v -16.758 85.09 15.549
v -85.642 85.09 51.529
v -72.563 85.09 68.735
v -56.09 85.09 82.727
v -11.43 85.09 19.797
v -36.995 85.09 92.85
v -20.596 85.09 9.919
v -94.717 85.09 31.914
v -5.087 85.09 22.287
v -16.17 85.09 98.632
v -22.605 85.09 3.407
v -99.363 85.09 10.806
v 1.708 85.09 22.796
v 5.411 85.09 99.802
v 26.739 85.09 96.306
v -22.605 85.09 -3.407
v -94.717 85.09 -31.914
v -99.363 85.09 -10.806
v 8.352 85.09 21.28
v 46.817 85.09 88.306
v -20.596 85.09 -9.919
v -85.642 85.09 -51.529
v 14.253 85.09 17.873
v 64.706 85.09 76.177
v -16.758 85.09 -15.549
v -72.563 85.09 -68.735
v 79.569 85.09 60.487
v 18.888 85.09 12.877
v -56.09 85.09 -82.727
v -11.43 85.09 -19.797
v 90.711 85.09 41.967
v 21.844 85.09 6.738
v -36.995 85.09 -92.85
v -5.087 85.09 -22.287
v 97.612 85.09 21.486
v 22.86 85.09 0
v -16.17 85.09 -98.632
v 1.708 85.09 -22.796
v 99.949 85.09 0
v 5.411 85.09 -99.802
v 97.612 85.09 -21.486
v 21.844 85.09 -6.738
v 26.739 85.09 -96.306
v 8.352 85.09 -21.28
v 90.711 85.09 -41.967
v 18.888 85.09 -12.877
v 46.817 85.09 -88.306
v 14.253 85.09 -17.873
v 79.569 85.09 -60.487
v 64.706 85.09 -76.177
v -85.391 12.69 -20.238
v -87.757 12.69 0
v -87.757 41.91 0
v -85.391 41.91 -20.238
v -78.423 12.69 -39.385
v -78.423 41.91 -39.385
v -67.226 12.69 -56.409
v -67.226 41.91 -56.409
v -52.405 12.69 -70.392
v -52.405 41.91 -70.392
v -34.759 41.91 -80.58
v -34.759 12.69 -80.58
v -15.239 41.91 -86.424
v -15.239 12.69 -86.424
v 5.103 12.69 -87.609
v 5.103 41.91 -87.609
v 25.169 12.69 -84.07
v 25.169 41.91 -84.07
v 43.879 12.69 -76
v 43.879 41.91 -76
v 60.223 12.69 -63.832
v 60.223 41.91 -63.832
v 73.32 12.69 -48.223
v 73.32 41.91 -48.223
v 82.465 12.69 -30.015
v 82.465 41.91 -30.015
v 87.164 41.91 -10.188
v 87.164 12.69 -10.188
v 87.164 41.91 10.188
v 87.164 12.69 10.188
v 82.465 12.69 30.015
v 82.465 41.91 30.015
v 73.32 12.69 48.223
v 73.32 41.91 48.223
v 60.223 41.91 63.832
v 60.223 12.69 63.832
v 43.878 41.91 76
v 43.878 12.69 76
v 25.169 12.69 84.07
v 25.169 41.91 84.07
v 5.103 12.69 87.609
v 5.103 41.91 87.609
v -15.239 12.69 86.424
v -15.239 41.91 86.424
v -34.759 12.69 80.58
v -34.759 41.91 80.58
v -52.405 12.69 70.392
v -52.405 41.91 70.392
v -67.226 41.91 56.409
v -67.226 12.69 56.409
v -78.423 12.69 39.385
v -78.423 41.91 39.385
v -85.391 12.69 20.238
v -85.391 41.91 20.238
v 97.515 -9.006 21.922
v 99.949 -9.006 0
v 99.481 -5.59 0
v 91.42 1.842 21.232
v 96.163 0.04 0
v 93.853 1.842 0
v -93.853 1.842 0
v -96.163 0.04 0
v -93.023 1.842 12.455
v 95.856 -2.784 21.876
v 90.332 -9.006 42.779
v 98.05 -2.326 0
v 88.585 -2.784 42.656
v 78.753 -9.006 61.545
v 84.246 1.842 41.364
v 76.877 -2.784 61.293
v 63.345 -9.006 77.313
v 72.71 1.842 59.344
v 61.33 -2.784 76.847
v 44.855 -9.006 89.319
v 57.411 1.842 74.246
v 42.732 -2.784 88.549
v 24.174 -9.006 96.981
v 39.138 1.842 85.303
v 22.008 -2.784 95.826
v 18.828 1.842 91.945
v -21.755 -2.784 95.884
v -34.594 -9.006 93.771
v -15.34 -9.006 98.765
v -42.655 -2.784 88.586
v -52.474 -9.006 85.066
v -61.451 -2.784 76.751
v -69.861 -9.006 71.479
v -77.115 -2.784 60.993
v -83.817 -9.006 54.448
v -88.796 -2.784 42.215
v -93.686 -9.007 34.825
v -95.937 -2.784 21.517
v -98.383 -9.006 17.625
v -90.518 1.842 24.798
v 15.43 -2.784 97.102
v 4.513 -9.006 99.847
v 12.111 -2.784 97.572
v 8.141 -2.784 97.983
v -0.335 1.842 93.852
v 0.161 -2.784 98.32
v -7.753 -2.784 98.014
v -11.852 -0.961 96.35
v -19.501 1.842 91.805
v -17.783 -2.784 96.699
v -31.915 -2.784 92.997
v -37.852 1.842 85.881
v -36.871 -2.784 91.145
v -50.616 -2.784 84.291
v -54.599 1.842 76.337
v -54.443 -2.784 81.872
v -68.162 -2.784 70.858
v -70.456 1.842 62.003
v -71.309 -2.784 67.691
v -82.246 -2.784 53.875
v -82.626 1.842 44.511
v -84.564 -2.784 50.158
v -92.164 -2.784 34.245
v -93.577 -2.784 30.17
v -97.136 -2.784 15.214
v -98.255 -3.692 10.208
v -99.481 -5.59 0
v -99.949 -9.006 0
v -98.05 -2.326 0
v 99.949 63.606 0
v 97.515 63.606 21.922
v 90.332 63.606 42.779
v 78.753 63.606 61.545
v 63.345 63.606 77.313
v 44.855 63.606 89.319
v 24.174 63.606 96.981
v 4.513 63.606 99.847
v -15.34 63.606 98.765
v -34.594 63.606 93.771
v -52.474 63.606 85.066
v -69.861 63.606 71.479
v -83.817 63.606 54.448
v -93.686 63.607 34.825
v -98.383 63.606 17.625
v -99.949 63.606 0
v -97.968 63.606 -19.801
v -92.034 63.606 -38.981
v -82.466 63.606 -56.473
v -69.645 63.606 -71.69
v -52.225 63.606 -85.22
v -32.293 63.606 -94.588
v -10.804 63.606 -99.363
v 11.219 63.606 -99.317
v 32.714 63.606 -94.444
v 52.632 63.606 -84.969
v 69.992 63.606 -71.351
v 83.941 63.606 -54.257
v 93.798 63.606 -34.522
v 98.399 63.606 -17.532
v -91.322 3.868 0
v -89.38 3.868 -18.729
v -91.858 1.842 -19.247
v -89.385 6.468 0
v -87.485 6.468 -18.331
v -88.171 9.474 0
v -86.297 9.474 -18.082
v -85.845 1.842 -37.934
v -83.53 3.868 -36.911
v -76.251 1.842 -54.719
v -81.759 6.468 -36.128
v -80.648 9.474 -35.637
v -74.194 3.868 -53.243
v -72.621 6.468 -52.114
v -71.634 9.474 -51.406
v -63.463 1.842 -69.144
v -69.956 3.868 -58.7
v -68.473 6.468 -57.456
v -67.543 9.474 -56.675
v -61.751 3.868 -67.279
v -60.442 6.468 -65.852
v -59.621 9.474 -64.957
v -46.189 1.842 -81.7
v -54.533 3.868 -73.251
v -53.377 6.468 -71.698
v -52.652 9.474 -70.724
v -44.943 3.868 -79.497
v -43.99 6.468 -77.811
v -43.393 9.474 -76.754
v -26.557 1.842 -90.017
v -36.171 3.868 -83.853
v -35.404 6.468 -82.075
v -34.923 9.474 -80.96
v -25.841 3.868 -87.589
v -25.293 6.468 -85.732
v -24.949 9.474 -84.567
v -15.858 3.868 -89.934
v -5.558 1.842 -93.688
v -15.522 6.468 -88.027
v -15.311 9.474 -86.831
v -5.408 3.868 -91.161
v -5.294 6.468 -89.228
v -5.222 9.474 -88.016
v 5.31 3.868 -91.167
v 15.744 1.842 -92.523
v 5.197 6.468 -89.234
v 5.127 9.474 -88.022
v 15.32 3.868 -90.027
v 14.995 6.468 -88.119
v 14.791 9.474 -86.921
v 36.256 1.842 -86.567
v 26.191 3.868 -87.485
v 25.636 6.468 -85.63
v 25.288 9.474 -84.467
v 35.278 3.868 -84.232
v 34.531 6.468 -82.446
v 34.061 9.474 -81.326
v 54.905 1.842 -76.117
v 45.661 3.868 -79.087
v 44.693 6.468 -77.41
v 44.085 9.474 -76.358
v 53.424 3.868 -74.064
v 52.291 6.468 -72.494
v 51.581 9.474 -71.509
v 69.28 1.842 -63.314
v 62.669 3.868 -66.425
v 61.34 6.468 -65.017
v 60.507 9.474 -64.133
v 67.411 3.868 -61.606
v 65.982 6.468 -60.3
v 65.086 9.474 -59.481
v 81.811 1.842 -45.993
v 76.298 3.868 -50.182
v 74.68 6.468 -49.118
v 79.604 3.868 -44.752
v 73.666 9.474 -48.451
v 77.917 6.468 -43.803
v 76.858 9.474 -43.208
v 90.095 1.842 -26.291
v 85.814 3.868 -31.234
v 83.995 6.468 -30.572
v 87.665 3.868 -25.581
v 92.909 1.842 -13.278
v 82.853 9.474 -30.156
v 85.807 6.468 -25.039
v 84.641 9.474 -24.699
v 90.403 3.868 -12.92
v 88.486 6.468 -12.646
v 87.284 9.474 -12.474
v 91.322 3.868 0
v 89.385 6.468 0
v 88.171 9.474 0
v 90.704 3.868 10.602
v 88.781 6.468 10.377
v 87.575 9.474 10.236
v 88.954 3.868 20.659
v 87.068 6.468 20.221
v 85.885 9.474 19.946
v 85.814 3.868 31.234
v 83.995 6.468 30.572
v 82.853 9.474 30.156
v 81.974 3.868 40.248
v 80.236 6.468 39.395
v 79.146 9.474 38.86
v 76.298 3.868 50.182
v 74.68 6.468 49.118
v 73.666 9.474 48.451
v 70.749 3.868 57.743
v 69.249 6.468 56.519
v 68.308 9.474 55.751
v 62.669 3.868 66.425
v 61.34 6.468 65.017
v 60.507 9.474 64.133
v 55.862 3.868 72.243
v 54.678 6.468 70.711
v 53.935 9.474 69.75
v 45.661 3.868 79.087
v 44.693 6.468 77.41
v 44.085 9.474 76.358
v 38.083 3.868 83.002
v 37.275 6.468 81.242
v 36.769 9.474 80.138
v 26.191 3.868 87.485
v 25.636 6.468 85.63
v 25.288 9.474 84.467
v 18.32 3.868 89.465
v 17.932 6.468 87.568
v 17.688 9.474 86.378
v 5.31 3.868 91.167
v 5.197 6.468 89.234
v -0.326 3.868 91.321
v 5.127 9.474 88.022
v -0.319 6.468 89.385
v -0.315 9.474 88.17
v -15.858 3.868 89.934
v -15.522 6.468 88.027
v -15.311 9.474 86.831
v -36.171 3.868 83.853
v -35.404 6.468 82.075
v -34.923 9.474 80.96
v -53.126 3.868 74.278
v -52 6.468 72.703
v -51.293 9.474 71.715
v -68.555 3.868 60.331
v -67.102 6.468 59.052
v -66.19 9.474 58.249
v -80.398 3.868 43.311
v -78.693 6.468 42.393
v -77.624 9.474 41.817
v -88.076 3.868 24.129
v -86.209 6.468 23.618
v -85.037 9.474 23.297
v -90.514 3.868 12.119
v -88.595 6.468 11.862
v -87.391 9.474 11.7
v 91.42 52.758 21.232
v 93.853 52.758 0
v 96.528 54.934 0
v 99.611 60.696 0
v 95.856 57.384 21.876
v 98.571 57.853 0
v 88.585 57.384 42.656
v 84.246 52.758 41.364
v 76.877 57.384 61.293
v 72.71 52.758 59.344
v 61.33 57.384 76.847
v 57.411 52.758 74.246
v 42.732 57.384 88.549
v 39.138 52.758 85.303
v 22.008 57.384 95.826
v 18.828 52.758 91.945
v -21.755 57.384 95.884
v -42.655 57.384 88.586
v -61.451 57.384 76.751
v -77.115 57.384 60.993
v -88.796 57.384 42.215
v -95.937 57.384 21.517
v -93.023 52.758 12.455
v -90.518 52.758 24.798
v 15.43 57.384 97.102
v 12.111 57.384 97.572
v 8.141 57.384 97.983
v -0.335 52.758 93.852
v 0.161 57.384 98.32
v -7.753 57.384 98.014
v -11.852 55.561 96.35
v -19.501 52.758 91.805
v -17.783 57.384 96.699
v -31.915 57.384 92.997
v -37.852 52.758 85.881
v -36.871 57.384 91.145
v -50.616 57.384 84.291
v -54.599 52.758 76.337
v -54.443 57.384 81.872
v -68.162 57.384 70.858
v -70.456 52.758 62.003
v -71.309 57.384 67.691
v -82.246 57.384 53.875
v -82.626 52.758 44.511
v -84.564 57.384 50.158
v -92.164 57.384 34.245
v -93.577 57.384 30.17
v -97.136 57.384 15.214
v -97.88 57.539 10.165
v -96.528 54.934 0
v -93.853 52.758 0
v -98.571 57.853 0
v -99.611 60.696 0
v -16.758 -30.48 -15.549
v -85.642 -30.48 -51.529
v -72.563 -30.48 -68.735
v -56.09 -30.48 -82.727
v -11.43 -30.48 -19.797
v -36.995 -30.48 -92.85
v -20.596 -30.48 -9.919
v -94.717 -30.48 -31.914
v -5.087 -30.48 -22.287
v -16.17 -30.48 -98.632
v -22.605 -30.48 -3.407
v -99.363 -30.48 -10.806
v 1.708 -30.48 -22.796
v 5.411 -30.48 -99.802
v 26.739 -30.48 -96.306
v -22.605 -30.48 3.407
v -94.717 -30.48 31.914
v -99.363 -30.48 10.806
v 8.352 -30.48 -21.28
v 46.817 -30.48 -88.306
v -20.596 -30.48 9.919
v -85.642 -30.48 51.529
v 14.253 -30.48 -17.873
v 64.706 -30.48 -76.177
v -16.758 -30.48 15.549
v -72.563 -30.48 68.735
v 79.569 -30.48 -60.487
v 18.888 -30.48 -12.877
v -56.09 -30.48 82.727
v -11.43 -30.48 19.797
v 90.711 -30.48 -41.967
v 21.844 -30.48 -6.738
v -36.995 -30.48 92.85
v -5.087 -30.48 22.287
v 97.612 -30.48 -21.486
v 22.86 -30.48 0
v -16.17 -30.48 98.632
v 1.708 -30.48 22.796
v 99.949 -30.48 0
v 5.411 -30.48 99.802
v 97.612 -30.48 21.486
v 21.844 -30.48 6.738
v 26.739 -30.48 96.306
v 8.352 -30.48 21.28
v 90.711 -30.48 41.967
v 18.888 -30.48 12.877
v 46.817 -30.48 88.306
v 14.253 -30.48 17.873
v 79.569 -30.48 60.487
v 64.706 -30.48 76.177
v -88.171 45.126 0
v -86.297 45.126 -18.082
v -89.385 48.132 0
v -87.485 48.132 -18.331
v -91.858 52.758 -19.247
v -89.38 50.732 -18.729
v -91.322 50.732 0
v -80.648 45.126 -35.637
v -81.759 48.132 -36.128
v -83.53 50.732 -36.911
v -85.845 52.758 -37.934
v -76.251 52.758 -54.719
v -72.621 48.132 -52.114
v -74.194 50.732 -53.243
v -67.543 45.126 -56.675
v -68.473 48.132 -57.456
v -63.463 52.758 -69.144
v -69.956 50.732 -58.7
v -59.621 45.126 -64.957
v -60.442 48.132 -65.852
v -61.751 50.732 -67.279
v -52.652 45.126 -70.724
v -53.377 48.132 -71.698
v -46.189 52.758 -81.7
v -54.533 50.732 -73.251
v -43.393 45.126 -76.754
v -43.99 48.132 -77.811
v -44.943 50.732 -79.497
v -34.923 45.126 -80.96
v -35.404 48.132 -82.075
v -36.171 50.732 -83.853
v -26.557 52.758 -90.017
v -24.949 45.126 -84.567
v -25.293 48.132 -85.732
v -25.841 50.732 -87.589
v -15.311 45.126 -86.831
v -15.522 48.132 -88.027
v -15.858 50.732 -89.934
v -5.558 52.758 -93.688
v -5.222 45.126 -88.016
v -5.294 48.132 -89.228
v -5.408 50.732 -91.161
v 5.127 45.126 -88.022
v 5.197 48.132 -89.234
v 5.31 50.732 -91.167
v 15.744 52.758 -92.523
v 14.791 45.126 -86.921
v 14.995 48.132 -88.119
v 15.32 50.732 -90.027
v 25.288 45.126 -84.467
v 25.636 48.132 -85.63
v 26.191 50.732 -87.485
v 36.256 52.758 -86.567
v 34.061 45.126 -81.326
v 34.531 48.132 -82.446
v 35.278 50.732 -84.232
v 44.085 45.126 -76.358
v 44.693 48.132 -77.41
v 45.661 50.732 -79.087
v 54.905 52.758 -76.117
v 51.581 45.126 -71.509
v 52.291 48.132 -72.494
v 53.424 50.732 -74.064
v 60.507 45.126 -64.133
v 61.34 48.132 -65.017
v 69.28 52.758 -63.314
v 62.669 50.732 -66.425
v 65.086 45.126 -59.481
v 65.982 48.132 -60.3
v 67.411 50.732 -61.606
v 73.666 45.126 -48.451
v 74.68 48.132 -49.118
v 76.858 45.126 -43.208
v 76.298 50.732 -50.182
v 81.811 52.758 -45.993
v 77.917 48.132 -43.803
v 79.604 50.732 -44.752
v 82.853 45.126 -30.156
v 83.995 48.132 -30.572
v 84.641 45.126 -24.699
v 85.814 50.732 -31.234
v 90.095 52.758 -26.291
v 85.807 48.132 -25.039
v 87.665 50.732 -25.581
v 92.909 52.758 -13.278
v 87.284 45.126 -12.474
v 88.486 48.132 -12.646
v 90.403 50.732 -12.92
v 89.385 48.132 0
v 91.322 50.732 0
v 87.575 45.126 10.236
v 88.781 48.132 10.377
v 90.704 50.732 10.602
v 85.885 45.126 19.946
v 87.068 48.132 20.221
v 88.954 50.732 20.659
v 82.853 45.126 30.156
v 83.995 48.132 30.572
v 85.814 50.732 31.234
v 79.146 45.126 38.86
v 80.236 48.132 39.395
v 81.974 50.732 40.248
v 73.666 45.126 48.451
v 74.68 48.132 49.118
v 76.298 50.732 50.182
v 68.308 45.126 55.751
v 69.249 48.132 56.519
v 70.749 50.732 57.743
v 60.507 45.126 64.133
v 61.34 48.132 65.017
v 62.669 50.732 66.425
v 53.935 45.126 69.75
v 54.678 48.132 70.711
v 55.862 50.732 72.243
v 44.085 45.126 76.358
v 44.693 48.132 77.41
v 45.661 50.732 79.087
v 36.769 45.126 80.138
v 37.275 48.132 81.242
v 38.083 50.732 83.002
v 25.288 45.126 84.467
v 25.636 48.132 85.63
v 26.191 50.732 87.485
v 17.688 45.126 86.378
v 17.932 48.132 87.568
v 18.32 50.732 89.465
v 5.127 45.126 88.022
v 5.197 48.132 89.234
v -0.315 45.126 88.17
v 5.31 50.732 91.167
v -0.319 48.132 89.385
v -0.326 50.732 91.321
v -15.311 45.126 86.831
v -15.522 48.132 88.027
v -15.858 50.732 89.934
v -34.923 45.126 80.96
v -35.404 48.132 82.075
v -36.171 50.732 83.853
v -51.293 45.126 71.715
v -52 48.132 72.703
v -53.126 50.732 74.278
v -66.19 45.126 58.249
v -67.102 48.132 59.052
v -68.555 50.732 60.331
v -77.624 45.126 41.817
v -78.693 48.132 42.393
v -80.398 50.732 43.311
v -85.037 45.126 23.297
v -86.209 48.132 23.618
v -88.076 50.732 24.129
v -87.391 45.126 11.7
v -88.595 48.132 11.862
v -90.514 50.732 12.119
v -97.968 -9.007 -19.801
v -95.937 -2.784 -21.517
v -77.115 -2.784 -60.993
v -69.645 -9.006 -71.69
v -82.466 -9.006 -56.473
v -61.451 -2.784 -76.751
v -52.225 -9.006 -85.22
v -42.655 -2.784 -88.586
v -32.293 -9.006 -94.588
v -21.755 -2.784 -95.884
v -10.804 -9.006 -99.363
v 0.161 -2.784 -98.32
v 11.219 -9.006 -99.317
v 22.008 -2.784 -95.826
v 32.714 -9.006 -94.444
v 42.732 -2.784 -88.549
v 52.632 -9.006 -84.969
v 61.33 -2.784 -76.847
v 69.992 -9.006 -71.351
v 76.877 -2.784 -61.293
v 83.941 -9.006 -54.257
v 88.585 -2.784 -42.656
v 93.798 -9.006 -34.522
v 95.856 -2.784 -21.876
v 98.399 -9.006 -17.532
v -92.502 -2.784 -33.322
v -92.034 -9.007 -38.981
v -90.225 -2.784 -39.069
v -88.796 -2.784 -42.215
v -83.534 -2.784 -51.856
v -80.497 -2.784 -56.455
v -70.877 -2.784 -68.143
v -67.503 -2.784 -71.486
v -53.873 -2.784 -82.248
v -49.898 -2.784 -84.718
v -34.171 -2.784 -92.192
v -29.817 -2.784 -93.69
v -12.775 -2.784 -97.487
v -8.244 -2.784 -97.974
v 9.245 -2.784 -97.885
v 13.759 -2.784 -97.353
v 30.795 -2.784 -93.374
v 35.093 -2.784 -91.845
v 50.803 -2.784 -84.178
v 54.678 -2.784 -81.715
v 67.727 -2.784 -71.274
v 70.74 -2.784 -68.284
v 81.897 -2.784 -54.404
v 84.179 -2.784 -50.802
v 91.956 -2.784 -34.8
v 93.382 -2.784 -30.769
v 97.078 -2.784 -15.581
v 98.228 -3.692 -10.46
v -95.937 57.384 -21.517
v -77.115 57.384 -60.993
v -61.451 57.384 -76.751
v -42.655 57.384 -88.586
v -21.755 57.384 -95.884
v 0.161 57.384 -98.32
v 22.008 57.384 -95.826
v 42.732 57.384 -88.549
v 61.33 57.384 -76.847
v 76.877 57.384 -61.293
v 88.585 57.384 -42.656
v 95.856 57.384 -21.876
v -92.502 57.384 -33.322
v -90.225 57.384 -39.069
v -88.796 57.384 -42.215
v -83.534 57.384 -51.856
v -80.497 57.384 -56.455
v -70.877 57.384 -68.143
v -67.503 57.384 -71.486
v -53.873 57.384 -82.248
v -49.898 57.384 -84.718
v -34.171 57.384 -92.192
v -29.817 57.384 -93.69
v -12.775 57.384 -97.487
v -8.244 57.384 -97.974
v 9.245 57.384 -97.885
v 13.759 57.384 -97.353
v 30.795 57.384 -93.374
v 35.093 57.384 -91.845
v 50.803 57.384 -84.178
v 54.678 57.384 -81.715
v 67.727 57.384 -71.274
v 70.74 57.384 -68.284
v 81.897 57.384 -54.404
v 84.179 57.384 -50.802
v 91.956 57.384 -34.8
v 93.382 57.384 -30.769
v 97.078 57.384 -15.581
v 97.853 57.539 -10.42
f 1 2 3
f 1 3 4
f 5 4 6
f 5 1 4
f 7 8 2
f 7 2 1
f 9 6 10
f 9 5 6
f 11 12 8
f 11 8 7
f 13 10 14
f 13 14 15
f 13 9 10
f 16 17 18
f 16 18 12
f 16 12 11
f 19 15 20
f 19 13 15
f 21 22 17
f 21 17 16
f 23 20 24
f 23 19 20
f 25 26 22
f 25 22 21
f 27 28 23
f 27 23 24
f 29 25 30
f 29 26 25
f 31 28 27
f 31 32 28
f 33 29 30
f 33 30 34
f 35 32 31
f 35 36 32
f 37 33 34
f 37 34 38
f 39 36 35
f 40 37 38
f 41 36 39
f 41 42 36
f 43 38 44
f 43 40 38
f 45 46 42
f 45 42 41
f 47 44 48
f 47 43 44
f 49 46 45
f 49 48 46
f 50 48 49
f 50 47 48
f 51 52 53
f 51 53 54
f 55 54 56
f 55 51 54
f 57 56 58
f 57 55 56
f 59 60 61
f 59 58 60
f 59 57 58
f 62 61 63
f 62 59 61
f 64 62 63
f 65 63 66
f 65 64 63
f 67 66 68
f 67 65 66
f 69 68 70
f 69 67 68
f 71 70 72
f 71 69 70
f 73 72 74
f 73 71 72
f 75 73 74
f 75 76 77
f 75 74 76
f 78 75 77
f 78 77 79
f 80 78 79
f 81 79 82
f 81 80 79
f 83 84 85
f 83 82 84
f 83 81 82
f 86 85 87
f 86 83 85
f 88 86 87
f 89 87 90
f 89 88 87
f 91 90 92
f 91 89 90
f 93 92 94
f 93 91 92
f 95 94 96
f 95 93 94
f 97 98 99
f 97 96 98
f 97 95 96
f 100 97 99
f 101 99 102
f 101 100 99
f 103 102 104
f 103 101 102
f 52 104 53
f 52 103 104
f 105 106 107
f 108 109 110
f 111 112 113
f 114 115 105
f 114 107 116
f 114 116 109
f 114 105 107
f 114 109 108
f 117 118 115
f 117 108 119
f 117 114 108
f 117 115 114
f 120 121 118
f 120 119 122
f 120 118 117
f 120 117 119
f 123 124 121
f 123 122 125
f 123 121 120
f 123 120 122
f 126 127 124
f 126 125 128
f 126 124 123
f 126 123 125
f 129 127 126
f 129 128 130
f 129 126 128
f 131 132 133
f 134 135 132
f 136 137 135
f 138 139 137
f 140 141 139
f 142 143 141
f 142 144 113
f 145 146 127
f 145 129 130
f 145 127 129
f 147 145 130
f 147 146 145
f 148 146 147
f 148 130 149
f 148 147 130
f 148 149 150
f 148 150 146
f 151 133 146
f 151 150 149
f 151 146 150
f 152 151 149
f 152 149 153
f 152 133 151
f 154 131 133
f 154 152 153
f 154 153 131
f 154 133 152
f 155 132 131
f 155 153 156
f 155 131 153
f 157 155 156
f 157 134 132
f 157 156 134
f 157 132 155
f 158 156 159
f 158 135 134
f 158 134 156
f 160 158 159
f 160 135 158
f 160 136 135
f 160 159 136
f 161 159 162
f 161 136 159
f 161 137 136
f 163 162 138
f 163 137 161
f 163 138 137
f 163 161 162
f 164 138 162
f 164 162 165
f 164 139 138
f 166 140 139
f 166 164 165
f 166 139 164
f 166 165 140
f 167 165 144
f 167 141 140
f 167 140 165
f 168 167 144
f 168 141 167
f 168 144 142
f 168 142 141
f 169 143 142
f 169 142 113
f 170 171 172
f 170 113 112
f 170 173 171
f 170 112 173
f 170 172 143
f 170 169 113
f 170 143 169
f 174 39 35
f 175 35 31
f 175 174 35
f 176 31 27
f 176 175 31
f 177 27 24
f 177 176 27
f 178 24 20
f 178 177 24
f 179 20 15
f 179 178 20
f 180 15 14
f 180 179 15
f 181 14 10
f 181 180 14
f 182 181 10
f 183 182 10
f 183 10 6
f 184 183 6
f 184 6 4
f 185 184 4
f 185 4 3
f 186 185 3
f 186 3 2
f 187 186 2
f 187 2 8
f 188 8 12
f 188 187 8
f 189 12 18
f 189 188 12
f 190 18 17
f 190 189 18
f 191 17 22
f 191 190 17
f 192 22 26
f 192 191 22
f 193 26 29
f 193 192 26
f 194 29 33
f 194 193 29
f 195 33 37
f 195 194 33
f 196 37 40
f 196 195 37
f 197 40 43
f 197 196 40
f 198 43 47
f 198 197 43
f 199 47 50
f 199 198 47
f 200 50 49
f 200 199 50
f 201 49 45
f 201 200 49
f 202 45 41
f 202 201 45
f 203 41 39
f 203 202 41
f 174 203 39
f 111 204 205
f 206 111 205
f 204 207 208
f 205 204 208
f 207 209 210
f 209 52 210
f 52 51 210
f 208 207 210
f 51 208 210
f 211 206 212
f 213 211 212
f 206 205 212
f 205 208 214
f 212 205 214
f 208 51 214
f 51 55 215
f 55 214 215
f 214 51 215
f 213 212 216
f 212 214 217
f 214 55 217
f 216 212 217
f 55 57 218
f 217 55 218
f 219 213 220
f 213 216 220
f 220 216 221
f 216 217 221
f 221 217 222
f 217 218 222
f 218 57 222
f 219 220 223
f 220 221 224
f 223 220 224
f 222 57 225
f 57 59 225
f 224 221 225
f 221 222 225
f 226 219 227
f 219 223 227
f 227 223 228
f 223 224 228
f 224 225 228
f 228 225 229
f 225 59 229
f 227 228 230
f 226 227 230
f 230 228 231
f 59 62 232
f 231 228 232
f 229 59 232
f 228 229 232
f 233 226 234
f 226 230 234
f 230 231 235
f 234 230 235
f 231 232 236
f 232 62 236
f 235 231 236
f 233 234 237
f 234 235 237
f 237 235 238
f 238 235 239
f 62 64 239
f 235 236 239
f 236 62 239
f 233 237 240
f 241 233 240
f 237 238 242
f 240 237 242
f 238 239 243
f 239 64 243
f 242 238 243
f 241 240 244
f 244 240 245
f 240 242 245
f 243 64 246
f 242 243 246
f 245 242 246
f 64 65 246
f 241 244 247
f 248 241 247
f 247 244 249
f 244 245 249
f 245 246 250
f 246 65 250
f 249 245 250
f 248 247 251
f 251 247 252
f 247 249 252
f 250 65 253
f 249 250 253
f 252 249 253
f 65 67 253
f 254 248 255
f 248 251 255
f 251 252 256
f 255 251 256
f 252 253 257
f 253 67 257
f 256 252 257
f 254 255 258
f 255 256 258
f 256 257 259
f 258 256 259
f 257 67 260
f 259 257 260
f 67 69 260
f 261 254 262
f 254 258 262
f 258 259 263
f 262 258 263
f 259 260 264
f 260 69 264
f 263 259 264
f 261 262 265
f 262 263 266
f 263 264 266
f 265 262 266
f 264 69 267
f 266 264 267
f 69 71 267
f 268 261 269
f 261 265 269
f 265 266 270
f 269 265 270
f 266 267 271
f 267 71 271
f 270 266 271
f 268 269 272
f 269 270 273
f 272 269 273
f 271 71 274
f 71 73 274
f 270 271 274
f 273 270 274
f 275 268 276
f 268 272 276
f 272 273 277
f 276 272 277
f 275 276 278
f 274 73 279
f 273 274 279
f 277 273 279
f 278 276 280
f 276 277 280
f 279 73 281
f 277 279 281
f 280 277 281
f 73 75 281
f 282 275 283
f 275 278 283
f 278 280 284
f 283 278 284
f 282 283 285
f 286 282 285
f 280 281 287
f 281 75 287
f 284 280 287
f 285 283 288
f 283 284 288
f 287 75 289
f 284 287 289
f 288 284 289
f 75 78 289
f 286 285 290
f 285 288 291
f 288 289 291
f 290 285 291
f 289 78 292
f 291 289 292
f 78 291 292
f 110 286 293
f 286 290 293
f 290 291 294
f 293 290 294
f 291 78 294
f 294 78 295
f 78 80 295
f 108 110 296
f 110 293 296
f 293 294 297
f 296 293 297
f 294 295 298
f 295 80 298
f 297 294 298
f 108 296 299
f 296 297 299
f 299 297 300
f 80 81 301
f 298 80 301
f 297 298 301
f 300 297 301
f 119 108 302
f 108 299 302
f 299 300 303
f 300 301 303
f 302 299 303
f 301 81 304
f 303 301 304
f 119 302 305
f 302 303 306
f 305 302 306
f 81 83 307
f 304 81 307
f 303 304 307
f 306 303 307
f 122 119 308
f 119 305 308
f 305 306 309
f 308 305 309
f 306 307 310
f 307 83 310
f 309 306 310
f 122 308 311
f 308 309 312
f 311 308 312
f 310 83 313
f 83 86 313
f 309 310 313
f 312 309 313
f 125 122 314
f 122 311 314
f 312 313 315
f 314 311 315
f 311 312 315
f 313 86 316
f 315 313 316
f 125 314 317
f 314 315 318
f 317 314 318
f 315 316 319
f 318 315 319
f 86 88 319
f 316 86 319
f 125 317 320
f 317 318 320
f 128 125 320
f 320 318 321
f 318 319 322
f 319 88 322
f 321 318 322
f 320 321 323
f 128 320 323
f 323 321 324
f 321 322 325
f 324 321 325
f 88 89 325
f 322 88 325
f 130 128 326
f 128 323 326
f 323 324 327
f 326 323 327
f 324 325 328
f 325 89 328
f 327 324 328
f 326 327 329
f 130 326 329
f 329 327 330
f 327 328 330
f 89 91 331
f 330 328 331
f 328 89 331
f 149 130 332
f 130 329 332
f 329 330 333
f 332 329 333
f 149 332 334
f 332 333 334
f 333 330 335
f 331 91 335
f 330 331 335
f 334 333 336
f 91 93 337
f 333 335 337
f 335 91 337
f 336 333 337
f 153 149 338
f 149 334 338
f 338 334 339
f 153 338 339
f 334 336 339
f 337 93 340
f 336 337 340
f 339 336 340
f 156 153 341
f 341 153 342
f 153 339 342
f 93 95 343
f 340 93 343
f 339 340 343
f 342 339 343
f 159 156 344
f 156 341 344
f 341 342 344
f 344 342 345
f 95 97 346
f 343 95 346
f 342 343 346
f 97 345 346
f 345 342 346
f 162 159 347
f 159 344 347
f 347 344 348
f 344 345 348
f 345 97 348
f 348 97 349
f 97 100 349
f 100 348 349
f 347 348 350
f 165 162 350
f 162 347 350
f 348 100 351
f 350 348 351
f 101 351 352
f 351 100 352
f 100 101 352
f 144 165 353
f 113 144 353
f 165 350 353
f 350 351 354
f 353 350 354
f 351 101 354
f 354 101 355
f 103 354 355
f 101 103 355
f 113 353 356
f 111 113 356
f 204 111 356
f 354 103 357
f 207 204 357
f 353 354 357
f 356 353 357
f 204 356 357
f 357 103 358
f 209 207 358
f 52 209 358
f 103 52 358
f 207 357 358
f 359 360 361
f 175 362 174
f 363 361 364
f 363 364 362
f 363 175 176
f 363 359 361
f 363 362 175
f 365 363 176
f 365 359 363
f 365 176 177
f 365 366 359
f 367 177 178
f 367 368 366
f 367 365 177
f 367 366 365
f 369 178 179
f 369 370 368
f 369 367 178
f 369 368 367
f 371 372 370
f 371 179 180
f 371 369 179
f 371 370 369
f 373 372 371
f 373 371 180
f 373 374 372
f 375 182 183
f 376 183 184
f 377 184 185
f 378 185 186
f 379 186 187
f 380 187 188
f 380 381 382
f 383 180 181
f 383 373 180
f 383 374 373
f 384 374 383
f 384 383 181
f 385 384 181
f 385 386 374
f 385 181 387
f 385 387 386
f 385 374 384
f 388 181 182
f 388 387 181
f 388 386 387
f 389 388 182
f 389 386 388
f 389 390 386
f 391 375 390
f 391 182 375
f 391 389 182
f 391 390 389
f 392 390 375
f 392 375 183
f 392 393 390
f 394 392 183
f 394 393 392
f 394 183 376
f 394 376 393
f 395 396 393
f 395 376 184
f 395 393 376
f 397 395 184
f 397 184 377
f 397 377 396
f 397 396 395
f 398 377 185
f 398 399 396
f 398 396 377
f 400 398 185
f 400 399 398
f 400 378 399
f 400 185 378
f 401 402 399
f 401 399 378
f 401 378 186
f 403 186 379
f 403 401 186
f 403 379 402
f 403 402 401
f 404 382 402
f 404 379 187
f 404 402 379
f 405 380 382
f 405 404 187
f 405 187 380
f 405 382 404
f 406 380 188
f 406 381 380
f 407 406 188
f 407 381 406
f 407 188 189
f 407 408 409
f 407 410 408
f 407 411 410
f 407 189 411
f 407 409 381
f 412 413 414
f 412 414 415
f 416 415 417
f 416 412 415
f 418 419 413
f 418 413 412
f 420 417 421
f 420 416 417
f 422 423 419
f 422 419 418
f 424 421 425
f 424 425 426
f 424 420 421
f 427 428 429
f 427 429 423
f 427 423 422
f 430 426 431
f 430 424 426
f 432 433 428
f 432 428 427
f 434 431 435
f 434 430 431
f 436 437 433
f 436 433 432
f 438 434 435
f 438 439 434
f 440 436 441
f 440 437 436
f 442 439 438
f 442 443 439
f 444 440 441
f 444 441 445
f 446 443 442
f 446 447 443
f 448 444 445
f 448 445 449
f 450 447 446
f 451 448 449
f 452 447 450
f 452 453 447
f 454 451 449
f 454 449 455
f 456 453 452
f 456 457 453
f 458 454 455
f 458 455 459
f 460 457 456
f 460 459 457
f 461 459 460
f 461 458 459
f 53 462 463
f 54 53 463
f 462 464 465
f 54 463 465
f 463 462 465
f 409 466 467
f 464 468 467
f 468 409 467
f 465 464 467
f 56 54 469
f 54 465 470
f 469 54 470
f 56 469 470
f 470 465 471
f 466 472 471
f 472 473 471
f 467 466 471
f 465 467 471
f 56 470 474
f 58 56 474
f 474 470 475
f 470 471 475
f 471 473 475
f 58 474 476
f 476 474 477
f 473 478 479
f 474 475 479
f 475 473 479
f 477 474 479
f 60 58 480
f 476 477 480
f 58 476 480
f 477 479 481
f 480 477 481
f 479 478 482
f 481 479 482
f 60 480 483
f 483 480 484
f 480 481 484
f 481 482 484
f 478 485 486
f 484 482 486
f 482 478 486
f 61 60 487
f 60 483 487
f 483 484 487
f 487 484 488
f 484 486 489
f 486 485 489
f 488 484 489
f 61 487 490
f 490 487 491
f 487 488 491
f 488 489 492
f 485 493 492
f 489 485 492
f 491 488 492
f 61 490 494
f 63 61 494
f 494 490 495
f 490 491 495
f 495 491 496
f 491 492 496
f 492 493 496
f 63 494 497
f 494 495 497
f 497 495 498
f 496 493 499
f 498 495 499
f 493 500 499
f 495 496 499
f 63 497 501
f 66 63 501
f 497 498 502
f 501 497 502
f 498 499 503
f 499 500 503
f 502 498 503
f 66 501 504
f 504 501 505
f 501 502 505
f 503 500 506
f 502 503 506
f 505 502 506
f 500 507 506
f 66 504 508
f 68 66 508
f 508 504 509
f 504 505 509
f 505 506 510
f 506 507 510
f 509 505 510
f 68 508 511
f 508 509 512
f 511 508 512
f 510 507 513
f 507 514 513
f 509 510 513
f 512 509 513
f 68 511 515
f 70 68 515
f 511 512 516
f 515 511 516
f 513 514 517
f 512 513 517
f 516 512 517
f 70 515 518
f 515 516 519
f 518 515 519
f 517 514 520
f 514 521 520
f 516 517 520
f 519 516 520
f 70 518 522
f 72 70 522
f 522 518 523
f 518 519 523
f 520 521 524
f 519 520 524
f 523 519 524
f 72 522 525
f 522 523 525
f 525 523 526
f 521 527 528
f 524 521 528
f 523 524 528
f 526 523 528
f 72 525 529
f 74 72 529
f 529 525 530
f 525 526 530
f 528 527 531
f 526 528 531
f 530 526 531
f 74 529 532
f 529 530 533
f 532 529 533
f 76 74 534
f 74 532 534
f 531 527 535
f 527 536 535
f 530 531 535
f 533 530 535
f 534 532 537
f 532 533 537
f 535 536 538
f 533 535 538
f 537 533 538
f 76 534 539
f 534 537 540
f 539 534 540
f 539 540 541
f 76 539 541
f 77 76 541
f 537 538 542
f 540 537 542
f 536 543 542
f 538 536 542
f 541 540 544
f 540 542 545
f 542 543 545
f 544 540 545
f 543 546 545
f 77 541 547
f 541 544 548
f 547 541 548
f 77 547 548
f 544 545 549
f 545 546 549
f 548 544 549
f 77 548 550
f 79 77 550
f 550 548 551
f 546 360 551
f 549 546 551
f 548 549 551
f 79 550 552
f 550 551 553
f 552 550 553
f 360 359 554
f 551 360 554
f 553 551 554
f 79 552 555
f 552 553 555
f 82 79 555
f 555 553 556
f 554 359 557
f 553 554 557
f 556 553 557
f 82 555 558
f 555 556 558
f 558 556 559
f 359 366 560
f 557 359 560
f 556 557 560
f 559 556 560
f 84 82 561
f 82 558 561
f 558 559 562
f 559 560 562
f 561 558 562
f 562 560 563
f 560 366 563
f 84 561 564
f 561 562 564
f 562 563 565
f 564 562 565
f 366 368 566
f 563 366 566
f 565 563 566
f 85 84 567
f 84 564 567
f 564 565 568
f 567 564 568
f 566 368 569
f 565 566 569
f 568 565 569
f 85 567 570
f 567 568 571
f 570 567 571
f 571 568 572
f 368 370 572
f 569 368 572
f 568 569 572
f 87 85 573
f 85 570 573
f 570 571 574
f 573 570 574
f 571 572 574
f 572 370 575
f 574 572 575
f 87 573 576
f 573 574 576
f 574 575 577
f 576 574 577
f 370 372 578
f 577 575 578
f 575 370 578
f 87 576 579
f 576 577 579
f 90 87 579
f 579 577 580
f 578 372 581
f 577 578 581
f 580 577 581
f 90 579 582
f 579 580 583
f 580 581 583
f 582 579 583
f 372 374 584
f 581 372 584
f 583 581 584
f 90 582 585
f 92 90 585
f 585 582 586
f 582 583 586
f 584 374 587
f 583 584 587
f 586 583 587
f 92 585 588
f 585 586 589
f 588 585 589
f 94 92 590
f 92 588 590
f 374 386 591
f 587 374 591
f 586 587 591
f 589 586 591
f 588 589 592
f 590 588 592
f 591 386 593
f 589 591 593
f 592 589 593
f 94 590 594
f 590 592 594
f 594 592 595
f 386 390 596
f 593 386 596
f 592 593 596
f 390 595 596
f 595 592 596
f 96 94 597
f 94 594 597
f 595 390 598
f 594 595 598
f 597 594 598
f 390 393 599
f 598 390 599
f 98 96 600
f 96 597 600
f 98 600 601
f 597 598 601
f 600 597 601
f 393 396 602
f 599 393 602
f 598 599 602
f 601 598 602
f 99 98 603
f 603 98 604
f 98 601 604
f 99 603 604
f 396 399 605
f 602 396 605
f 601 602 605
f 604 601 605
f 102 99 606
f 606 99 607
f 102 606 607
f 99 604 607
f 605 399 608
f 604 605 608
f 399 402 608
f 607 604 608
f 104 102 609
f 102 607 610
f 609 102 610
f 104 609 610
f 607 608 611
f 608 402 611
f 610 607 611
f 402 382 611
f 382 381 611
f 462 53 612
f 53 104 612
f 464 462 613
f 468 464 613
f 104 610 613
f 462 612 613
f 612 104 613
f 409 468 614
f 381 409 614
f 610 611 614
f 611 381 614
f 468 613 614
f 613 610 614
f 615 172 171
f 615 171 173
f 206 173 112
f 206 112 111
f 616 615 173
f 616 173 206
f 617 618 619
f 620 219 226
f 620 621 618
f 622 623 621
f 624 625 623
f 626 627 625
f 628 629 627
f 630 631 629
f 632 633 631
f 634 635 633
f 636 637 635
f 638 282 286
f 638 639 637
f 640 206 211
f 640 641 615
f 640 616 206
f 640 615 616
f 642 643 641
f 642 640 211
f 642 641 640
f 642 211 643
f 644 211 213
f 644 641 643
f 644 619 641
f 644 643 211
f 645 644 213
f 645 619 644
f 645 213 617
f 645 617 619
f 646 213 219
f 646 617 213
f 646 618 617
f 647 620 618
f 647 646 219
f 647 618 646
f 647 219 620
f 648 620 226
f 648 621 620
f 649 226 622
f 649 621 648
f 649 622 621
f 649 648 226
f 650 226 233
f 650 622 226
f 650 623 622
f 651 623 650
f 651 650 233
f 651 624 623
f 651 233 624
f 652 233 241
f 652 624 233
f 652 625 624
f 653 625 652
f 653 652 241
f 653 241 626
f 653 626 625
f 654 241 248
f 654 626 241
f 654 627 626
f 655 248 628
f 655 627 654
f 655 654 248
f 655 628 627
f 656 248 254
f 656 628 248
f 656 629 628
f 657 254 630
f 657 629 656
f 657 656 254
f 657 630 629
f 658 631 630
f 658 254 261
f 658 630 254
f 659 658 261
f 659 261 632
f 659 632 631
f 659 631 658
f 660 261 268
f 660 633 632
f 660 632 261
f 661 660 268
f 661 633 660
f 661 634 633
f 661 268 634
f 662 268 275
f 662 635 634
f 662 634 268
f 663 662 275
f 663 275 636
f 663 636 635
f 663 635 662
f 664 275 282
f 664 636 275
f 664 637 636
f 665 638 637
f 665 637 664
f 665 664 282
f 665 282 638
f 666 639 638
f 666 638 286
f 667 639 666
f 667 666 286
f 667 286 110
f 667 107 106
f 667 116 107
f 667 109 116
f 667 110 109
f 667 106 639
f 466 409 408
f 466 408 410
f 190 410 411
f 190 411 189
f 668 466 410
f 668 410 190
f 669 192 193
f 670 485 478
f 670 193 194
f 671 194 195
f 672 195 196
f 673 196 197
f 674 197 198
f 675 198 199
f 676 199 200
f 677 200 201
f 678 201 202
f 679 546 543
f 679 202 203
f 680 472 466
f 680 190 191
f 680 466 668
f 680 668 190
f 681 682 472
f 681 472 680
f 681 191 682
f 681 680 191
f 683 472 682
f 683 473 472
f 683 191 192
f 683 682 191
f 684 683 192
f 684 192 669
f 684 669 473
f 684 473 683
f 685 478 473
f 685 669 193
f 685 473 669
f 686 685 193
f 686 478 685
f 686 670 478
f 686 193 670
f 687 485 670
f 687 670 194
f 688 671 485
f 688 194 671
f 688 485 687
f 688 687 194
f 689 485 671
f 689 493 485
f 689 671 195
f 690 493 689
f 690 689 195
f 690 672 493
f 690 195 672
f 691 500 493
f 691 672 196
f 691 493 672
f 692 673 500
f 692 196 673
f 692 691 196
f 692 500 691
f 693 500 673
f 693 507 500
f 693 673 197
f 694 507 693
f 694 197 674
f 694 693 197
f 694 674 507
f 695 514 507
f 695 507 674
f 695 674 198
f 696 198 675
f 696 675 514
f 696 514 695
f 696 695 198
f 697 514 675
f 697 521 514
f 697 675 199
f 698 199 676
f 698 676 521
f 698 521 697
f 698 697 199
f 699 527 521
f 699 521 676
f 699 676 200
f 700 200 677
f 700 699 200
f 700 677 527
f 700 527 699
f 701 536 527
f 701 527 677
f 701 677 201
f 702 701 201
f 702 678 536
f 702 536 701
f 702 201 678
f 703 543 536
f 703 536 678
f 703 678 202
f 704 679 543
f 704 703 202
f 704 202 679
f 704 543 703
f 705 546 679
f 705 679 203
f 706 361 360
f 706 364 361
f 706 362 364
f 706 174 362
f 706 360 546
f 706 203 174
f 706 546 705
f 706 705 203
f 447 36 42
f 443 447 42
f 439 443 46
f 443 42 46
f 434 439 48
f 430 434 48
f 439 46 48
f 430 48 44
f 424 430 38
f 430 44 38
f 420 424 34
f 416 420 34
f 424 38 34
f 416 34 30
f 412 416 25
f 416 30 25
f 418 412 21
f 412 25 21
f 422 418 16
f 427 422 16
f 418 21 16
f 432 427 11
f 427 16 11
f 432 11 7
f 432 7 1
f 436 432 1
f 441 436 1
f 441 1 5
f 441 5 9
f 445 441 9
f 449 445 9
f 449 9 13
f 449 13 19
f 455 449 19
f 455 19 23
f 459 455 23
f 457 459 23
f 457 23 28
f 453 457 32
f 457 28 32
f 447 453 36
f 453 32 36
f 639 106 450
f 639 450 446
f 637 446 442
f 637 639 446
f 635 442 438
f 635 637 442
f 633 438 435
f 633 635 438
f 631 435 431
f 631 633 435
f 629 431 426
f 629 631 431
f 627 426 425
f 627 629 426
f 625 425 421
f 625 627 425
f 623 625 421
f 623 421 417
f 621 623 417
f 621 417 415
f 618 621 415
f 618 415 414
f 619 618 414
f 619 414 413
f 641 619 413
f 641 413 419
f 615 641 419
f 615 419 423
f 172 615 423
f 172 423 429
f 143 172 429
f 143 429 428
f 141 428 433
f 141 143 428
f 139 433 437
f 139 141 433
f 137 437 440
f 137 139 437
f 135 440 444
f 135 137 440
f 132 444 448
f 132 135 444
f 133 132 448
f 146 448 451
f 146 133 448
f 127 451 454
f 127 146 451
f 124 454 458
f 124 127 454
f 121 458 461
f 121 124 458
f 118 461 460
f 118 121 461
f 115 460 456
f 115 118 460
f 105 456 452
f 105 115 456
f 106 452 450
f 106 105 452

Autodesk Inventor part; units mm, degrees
ref_plane "YZ Plane" through (0, 0, 0) normal (1, 0, 0) x (0, 1, 0)
ref_plane "XZ Plane" through (0, 0, 0) normal (0, 1, 0) x (-1, 0, 0)
ref_plane "XY Plane" through (0, 0, 0) normal (0, 0, 1) x (1, 0, 0)
sketch "Sketch1" plane through (0, 0, 0) normal (0, 1, 0) x (-1, 0, 0)
  circle A0 centre (0, 0) radius 87.757
  dimension "d0" = 175.514
extrude "Extrusion1" add sketch "Sketch1" along normal blind 54.61
sketch "Sketch2" plane through (0, 54.61, 0) normal (0, 1, 0) x (1, 0, 0)
  circle A0 centre (0, 0) radius 99.949
  dimension "d3" = 199.898
sketch "Sketch3" plane through (0, 0, 0) normal (0, -1, 0) x (1, 0, 0)
  circle A0 centre (0, 0) radius 99.949
  dimension "d4" = 199.898
extrude "Extrusion2" add sketch "Sketch2" along normal blind 30.48
extrude "Extrusion3" add sketch "Sketch3" along normal blind 30.48
sketch "Sketch4" plane through (0, 85.09, 0) normal (0, 1, 0) x (1, 0, 0)
  circle A0 centre (0, 0) radius 22.86
  dimension "d9" = 45.72
extrude "Extrusion4" cut sketch "Sketch4" against normal blind 115.57
fillet "Fillet1" radius 12.7 1 edges at (87.757, 54.61, 0)
fillet "Fillet2" radius 12.7 1 edges at (87.757, 0, 0)
fillet "Fillet3" radius 12.7 4 edges at (0, 0, 99.949) (0, 0, -99.949) (0, 54.5998, 99.949) (0, 54.5998, -99.949)
properties part number "Pulley" material "Acetal Resin, Black"
